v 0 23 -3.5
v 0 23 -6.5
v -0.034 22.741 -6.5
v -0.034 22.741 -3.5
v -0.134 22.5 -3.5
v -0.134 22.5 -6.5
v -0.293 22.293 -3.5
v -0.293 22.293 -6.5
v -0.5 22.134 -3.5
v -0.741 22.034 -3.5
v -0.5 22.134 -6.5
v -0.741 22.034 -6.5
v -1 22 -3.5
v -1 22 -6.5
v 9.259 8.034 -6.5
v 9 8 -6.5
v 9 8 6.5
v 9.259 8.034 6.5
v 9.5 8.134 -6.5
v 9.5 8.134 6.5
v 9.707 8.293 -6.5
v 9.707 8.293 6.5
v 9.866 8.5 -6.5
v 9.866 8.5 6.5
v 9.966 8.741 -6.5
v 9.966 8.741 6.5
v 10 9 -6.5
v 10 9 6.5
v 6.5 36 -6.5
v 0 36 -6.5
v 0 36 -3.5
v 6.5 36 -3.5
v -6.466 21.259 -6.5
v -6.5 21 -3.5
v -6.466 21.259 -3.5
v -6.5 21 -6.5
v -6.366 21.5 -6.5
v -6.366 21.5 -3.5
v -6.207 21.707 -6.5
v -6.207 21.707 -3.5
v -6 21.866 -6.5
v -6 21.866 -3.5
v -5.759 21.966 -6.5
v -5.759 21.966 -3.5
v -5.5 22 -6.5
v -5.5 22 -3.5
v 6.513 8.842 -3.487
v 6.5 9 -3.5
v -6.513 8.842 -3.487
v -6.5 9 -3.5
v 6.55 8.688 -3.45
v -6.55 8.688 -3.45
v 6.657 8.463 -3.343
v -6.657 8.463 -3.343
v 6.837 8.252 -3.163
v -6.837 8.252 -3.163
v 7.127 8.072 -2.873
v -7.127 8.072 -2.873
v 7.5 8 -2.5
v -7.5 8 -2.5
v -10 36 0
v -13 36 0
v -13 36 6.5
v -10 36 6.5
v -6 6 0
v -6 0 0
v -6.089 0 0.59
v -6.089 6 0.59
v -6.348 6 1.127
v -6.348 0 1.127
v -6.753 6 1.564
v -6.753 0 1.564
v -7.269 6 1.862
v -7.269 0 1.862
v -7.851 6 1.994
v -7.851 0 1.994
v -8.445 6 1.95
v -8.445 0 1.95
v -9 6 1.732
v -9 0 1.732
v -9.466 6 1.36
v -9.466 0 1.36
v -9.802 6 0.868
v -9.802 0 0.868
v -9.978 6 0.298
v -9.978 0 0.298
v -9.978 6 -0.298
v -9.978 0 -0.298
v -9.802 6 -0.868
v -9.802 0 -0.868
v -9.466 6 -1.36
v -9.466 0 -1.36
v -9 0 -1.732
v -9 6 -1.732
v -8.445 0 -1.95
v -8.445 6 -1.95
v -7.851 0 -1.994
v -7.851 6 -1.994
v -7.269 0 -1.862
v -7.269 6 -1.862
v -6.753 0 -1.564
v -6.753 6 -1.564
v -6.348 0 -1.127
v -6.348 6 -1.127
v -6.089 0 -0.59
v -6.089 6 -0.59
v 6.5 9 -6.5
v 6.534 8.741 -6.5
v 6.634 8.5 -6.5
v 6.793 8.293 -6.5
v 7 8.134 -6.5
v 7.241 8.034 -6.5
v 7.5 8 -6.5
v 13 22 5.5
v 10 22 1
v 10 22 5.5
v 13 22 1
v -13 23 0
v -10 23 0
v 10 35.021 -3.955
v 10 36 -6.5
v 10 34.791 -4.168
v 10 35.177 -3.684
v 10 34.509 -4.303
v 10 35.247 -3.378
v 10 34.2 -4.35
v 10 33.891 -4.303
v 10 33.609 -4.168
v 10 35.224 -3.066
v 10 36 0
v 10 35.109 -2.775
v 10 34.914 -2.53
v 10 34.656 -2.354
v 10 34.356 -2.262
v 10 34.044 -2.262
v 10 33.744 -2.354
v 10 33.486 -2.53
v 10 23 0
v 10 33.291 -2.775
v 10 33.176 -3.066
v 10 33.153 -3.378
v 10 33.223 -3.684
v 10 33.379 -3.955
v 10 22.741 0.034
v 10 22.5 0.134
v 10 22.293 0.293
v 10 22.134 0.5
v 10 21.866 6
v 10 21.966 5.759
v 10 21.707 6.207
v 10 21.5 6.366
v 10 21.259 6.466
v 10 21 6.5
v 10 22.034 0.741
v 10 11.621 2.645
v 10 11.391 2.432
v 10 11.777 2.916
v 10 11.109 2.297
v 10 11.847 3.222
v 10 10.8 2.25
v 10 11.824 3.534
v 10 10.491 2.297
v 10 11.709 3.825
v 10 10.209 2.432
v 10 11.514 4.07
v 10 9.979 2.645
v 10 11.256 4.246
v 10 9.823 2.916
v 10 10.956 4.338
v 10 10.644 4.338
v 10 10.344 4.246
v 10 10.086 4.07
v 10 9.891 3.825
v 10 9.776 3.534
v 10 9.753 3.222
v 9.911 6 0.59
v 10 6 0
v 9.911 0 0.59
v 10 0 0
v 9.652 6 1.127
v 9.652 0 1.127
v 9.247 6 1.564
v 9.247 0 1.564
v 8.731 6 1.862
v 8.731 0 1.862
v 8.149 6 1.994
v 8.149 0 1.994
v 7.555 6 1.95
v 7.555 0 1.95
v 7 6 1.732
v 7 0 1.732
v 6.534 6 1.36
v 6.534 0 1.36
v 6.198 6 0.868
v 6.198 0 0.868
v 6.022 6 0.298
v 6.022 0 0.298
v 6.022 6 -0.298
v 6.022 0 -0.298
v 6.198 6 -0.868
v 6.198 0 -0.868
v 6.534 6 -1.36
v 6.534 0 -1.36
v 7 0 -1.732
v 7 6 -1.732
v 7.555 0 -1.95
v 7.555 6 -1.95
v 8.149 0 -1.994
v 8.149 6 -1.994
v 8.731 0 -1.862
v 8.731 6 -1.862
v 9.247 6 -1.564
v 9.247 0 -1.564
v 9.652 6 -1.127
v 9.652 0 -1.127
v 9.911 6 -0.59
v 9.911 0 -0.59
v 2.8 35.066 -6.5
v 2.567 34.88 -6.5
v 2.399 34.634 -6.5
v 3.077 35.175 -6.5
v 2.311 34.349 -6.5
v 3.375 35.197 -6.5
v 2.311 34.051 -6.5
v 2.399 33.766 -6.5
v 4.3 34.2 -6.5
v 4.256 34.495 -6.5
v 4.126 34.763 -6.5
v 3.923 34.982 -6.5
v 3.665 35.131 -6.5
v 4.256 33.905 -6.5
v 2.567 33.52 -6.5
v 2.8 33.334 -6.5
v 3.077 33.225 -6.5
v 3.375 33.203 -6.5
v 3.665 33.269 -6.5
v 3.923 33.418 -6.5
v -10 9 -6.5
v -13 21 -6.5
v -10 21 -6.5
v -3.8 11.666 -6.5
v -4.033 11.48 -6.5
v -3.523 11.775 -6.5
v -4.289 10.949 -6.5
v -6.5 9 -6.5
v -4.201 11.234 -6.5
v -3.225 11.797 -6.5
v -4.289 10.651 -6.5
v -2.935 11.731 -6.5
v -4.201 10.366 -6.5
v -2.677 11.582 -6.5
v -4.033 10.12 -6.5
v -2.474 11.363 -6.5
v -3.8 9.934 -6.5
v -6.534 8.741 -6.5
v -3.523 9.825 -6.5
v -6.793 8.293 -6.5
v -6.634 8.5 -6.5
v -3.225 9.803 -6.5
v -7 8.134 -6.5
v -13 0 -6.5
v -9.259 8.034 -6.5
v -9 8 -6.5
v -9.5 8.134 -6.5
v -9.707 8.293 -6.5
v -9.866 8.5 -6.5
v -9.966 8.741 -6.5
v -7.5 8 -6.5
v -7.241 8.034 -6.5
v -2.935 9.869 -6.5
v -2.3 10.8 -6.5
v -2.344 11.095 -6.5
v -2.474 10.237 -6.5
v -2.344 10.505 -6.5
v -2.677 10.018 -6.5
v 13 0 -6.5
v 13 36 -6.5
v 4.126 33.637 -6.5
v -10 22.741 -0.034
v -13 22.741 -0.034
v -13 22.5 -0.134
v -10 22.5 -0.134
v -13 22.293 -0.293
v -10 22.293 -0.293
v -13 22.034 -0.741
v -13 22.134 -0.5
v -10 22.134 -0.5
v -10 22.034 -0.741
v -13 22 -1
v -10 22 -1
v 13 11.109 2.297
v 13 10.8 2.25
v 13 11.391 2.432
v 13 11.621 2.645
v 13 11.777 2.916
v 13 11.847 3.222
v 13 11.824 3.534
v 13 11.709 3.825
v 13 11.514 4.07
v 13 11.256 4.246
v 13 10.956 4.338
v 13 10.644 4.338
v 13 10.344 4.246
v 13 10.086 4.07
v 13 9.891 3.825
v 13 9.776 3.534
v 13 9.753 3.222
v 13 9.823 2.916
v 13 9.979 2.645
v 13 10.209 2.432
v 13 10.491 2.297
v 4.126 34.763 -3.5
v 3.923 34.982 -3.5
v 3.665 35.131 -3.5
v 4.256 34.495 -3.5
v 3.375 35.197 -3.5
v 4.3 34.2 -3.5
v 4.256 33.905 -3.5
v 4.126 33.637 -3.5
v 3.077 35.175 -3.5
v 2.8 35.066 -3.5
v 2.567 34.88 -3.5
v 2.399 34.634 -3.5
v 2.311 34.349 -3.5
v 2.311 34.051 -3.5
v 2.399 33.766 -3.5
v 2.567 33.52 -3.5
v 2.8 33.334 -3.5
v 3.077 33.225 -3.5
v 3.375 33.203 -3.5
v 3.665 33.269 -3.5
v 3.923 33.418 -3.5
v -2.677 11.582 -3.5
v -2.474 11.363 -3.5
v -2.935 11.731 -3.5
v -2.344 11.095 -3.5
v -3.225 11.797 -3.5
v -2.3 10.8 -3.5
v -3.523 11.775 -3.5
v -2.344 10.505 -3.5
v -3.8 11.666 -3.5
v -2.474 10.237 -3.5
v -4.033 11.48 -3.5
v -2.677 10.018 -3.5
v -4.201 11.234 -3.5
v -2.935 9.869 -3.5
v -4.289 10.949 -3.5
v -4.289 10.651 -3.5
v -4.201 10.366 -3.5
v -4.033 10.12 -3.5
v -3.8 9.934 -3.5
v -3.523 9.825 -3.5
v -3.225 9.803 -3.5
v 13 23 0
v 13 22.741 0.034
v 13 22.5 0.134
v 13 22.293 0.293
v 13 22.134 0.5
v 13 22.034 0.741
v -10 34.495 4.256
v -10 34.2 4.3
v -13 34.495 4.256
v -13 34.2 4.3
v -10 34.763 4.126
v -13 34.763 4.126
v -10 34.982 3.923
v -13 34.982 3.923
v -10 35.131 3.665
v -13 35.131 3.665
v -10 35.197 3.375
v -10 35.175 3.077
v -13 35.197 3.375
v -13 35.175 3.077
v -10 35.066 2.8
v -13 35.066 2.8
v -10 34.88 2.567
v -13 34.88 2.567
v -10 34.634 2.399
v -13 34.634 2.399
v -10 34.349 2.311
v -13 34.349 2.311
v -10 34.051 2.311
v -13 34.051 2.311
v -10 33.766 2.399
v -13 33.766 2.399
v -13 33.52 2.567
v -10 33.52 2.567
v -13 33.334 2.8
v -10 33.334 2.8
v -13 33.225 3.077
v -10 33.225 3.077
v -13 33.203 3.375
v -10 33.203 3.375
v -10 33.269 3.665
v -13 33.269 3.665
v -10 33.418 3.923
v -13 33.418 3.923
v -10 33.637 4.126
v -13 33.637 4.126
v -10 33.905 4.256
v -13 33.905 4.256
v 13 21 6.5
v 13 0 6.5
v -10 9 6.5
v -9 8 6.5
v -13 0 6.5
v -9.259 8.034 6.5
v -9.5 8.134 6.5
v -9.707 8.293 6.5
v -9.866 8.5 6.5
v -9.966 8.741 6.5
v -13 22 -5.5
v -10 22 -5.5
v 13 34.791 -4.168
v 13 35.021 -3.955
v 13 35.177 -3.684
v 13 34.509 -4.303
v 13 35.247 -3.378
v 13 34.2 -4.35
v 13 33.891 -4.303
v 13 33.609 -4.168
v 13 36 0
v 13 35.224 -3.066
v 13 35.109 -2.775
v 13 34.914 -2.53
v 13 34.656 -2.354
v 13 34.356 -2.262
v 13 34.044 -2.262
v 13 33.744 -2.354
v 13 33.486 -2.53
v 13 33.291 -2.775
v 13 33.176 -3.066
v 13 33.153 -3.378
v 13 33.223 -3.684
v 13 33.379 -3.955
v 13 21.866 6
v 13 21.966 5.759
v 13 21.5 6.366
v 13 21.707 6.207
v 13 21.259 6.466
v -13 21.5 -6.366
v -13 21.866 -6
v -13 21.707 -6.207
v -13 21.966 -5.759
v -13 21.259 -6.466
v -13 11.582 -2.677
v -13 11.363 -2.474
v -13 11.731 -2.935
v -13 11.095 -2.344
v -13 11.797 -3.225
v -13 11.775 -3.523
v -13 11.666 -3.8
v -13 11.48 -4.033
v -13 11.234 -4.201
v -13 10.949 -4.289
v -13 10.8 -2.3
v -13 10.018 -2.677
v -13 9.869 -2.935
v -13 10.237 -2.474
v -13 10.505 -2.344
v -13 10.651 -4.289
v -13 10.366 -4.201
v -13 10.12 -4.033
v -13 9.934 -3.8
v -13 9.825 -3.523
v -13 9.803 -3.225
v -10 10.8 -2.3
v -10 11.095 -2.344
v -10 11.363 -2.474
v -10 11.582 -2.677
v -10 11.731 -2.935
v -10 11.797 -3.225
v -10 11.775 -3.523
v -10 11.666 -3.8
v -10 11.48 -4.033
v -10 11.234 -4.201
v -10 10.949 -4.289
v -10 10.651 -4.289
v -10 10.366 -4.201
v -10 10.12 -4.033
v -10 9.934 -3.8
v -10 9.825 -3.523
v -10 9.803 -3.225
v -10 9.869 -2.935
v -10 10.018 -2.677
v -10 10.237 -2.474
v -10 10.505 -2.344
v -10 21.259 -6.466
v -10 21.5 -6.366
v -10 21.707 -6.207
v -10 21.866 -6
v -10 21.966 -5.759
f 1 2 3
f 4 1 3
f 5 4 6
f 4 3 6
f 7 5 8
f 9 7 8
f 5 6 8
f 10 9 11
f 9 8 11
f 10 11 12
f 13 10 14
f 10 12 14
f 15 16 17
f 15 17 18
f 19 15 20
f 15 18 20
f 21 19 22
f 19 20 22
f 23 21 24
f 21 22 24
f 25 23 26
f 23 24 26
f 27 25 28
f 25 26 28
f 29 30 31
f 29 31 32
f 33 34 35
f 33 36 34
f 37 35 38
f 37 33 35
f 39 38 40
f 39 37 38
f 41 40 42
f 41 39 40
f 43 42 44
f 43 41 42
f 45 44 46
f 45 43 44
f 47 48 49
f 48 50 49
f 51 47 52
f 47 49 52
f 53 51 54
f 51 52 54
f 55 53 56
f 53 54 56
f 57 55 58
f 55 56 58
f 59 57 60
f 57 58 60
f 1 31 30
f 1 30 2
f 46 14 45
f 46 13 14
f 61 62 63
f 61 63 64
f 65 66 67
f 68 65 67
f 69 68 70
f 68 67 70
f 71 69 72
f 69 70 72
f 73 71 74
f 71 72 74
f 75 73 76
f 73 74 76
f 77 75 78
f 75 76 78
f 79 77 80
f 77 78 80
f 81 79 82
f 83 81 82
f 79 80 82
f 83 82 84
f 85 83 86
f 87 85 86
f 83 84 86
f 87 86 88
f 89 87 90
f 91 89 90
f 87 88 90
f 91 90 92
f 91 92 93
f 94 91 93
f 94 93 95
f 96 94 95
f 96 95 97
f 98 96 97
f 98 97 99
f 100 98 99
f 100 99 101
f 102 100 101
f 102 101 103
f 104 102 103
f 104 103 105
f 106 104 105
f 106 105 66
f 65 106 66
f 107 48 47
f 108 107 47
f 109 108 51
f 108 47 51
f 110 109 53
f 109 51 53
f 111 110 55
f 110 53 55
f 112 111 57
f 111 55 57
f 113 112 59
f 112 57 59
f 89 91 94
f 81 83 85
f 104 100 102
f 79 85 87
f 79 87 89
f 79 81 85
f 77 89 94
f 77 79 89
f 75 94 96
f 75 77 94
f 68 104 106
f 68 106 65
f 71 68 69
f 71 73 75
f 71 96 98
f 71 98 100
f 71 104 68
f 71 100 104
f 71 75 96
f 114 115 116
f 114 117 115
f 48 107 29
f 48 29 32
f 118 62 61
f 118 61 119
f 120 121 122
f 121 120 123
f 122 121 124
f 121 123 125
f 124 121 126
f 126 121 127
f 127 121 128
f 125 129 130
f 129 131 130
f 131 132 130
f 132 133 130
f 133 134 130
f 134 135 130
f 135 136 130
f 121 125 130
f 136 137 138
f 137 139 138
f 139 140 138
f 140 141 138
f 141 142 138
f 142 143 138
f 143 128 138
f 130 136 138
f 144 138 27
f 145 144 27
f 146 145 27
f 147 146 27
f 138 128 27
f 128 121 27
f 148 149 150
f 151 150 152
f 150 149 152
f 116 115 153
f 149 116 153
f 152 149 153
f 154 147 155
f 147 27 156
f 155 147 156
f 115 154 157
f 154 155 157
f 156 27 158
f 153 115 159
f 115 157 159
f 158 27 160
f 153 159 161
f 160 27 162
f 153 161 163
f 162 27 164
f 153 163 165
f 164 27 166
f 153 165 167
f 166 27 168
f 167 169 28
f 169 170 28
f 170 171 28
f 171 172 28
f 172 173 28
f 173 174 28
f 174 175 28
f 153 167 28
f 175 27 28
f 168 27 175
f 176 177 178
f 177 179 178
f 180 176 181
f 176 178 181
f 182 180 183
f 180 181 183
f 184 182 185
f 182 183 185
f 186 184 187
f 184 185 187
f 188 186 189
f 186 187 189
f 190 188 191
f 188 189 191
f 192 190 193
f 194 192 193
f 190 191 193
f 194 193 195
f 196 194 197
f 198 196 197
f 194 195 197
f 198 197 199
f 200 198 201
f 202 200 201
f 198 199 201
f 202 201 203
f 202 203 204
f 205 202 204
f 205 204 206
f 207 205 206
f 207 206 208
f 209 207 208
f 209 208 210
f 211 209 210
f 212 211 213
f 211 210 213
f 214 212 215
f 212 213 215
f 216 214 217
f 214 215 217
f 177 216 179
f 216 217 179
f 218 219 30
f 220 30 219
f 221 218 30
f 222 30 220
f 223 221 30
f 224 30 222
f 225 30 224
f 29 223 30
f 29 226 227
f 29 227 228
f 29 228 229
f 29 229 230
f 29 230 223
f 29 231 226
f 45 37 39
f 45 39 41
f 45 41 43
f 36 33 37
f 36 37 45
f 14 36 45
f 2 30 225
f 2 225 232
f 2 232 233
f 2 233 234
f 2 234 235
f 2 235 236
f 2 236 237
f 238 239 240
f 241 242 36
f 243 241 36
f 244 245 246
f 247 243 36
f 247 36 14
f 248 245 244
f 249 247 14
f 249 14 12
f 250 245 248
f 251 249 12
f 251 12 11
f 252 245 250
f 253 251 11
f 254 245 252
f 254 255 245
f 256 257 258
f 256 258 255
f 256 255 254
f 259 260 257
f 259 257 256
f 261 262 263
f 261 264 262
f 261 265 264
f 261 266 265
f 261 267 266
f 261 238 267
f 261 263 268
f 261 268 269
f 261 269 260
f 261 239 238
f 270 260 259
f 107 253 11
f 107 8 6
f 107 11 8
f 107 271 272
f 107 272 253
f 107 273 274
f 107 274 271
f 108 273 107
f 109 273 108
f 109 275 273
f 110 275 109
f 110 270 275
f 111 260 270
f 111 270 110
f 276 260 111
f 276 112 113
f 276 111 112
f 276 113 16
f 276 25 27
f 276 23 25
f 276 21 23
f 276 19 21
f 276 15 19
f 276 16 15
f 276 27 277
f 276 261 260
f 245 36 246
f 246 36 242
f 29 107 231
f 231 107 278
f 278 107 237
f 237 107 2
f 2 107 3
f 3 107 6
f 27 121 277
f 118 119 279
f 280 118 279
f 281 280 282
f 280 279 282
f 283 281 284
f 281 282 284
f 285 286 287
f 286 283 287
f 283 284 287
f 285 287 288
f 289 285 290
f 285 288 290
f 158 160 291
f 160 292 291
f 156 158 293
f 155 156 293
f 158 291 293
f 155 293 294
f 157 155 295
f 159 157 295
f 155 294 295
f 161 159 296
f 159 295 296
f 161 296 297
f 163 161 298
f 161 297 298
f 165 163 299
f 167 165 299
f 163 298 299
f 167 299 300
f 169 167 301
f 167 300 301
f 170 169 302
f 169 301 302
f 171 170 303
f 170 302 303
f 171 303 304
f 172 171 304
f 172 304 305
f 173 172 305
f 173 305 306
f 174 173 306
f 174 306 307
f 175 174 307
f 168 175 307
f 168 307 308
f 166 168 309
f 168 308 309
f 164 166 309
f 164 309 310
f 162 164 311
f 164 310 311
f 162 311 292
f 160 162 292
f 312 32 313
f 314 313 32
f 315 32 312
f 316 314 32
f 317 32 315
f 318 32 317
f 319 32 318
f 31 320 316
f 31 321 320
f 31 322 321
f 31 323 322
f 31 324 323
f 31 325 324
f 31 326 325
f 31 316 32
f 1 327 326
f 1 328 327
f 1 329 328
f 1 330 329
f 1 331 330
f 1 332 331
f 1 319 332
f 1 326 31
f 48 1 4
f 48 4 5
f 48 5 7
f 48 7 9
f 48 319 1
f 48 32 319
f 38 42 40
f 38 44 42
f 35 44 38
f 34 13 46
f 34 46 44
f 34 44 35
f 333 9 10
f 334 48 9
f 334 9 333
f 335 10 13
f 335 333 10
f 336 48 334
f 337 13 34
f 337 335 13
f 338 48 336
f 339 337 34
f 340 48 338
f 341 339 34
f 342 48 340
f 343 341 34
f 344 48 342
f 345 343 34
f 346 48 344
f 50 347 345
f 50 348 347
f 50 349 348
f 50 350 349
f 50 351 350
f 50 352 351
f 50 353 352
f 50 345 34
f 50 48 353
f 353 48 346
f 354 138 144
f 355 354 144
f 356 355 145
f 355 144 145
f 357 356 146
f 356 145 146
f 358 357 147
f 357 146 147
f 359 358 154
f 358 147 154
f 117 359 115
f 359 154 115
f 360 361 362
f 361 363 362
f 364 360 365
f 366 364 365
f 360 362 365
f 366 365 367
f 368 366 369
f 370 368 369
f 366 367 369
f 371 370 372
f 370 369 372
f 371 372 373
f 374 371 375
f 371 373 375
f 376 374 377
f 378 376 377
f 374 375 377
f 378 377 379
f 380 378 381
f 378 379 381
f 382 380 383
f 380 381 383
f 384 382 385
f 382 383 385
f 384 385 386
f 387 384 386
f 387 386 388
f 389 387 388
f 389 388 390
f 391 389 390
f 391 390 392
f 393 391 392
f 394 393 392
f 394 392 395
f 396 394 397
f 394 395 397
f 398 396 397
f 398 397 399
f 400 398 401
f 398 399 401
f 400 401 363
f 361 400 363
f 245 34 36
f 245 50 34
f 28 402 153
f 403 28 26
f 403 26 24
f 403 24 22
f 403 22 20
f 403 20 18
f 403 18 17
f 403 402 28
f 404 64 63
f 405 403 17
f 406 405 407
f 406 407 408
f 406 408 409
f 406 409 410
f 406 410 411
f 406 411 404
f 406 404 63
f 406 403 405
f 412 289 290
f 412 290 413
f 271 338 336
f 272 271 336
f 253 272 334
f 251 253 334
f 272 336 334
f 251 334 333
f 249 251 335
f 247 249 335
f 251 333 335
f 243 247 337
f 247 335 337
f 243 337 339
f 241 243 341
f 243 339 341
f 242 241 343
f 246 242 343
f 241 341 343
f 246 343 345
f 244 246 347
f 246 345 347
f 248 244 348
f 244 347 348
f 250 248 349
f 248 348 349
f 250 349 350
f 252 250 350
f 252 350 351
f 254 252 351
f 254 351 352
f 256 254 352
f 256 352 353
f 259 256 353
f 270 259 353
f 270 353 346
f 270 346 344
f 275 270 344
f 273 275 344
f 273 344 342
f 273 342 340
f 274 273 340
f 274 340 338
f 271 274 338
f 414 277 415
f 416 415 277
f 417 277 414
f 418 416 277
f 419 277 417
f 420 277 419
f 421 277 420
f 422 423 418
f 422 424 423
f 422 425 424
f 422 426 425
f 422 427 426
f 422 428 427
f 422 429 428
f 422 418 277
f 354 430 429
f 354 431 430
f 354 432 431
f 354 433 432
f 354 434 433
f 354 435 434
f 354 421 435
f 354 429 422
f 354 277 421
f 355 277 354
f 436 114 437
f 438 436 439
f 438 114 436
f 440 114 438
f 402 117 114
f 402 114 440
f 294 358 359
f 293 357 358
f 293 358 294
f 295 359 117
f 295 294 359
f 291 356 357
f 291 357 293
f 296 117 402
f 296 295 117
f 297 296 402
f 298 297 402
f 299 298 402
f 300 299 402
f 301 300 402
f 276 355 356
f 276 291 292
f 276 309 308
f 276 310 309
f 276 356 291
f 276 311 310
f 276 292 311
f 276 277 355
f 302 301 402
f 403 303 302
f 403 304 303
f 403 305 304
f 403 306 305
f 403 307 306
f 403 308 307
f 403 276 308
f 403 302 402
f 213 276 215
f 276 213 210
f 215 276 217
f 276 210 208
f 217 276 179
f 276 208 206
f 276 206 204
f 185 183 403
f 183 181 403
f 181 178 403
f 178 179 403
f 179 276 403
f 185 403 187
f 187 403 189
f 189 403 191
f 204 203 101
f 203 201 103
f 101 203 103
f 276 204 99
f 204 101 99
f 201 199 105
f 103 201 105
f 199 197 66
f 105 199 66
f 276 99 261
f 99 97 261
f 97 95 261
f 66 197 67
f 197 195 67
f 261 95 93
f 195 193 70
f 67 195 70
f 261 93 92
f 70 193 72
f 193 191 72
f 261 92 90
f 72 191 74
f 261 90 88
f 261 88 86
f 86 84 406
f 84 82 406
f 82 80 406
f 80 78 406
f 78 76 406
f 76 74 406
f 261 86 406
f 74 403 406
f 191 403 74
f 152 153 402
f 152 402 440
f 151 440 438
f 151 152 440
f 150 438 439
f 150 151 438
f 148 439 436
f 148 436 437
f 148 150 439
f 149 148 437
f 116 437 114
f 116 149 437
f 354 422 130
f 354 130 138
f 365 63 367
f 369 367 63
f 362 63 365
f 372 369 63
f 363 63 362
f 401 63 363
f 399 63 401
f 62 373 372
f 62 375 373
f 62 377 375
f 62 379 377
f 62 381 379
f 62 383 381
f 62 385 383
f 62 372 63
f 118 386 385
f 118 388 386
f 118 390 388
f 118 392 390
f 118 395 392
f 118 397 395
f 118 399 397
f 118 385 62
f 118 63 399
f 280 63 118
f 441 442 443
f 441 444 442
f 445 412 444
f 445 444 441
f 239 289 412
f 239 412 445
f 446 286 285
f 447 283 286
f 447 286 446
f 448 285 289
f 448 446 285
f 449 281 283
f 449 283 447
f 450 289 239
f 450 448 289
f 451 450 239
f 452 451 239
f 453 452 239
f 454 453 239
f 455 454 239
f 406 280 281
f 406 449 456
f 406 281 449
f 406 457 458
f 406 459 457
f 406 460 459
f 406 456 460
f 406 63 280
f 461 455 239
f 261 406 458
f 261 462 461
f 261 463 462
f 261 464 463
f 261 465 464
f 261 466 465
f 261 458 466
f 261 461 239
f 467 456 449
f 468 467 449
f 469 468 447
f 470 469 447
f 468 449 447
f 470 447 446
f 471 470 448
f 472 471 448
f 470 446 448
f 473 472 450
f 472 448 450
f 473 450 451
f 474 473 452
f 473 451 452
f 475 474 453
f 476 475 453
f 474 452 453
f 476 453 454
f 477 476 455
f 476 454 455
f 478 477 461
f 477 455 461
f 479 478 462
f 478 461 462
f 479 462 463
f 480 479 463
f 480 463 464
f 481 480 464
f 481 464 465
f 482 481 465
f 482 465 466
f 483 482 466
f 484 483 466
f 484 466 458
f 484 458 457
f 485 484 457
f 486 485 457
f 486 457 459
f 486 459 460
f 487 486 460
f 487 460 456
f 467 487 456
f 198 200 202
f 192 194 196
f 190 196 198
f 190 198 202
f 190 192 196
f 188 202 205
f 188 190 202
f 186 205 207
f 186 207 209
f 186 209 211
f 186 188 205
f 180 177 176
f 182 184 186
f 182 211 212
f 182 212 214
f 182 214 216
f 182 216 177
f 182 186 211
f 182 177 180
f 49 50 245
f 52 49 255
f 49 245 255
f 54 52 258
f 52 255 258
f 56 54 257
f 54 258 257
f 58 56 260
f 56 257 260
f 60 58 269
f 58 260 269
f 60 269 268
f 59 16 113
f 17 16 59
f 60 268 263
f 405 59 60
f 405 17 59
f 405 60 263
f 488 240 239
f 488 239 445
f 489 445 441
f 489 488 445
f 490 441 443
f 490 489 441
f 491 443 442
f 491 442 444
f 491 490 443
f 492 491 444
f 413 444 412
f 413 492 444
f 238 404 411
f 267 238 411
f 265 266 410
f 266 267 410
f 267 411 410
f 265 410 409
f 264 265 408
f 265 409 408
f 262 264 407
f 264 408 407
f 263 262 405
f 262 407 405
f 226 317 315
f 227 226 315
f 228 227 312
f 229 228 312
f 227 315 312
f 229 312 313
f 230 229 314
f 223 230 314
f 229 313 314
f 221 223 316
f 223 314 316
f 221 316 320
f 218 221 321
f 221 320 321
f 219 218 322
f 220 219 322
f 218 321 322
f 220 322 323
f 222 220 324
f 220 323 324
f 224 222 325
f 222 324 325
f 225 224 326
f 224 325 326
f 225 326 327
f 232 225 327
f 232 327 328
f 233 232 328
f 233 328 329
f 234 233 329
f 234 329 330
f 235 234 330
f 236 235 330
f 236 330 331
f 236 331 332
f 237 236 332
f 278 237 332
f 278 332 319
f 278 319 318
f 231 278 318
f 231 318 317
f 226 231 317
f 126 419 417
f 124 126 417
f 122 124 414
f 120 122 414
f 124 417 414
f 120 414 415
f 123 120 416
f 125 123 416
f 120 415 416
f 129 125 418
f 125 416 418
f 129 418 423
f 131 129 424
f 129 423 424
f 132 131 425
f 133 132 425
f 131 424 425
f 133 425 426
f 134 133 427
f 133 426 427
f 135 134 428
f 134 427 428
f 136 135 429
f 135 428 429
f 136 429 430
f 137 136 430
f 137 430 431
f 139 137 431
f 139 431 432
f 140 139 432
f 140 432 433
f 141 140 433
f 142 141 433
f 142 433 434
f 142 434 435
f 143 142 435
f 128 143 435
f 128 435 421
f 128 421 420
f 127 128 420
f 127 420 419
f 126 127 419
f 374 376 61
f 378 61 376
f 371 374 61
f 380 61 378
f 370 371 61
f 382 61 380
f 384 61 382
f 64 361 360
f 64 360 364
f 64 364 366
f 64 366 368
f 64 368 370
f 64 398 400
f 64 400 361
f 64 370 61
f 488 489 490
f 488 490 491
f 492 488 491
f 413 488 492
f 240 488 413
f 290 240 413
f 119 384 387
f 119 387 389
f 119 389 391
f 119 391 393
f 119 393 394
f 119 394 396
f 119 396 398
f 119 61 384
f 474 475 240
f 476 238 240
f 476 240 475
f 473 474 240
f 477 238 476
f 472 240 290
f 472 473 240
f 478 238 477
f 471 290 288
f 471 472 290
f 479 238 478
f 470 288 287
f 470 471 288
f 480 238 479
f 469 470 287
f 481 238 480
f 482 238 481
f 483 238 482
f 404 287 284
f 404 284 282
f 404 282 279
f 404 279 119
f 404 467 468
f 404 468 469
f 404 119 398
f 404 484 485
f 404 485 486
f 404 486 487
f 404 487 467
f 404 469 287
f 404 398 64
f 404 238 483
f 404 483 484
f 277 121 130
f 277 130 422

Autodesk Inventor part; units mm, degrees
ref_plane "YZ Plane" through (0, 0, 0) normal (1, 0, 0) x (0, 1, 0)
ref_plane "TOP" through (0, 36, 0) normal (0, 1, 0) x (-1, 0, 0)
sketch "Sketch1" plane through (0, 0, 0) normal (0, 1, 0) x (-1, 0, 0)
  line L0 (13, -6.5) -> (-13, -6.5)
  line L1 (-13, -6.5) -> (-13, 6.5)
  line L2 (-13, 6.5) -> (13, 6.5)
  line L3 (13, 6.5) -> (13, -6.5)
  line L4 (0, -9.1) -> (0, 9.1) projected
  line L5 (18.2, 0) -> (-18.2, 0) projected
  point P0 (0, 0)
  dimension "d0" = 26
  dimension "d1" = 13
extrude "Extrusion1" add sketch "Sketch1" along normal blind 8
sketch "Sketch2" plane through (0, 8, 0) normal (0, 1, 0) x (1, 0, 0)
  line L0 (-13, 6.5) -> (-13, -6.5) projected
  line L1 (-13, 6.5) -> (-10, 6.5)
  line L2 (-10, 6.5) -> (-10, -6.5)
  line L3 (-10, -6.5) -> (-13, -6.5)
  line L4 (-13, -6.5) -> (-13, 6.5)
  line L5 (13, 6.5) -> (-13, 6.5) projected
  line L6 (13, 6.5) -> (10, 6.5)
  line L7 (10, 6.5) -> (10, -6.5)
  line L8 (10, -6.5) -> (13, -6.5)
  line L9 (13, -6.5) -> (13, 6.5)
  line L10 (-6.5, 6.5) -> (6.5, 6.5)
  line L11 (6.5, 6.5) -> (6.5, 3.5)
  line L12 (6.5, 3.5) -> (-6.5, 3.5)
  line L13 (-6.5, 3.5) -> (-6.5, 6.5)
  line L14 (0, 9.1) -> (0, -9.1) projected
  line L15 (-13, -6.5) -> (13, -6.5) projected
  point P0 (0, 0)
  dimension "d4" = 3
  dimension "d5" = 3
  dimension "d6" = 3
  dimension "d7" = 13
extrude "Extrusion2" add sketch "Sketch2" along normal up to surface (28 mm away) contours L1 L2 L3 L0 | L5 L14 L12 L13 | L5 L11 L12 L14 | L7 L5 L9 L8
sketch "Sketch3" plane through (-13, 0, -6.5) normal (-1, 0, 0) x (0, 0, 1)
  line L0 (0, 36) -> (6.5, 36)
  line L1 (6.5, 36) -> (6.5, 22)
  line L2 (6.5, 22) -> (0, 22)
  line L3 (0, 22) -> (0, 36)
  line L4 (0, 0) -> (13, 0) projected
  line L5 (13, 0) -> (13, 36) projected
  line L6 (13, 36) -> (0, 36) projected
  line L7 (0, 0) -> (0, 36) projected
  point P0 (6.5, 0)
  dimension "d11" = 22
  dimension "d12" = 6.5
extrude "Extrusion3" cut sketch "Sketch3" against normal blind 3 contours L0 L1 L2 L3
sketch "Sketch4" plane through (13, 0, 6.5) normal (1, 0, 0) x (0, 0, -1)
  line L0 (6.5, 36) -> (0, 36) projected
  line L1 (0, 36) -> (6.5, 36)
  line L2 (6.5, 36) -> (6.5, 22)
  line L3 (6.5, 22) -> (0, 22)
  line L4 (0, 22) -> (0, 36)
  line L5 (-2.6, 0) -> (15.6, 0) projected
  line L6 (13, 0) -> (13, 36) projected
  point P0 (6.5, 0)
  dimension "d15" = 22
  dimension "d16" = 6.5
extrude "Extrusion4" cut sketch "Sketch4" against normal blind 3
sketch "Sketch5" plane through (-6.5, 8, -3.5) normal (0, 0, 1) x (1, 0, 0)
  line L0 (0, 0) -> (0, 28) projected
  line L1 (0, 28) -> (6.5, 28)
  line L2 (6.5, 28) -> (6.5, 14)
  line L3 (6.5, 14) -> (0, 14)
  line L4 (0, 14) -> (0, 28)
  line L5 (13, 0) -> (13, 28) projected
  line L6 (-6.5, -8) -> (19.5, -8) projected
  point P0 (6.5, -8)
  point P1 (0, 14)
  dimension "d19" = 6.5
  dimension "d20" = 22
extrude "Extrusion5" cut sketch "Sketch5" against normal blind 3
sketch "Sketch6" plane through (13, 0, 6.5) normal (1, 0, 0) x (0, 0, -1)
  circle A0 centre (9.8, 34.2) radius 1.05
  circle A1 centre (3.2, 10.8) radius 1.05
  line L0 (13, 0) -> (13, 36) projected
  line L1 (13, 36) -> (6.5, 36) projected
  line L2 (0, 0) -> (0, 22) projected
  line L3 (6.5, 36) -> (6.5, 22) projected
  point P0 (6.5, 0)
  point P1 (0, 8)
  dimension "d23" = 2.1
  dimension "d25" = 1.8
  dimension "d27" = 2.8
  dimension "d30" = 3.3
  dimension "d31" = 3.3
extrude "Extrusion6" cut sketch "Sketch6" against normal blind 3
ref_plane "Work Plane2" through (13, 22, 6.5) normal (0, 1, 0) x (1, 0, 0)
sketch "Sketch7" plane through (-13, 0, -6.5) normal (-1, 0, 0) x (0, 0, 1)
  circle A0 centre (9.8, 34.2) radius 1
  circle A1 centre (3.2, 10.8) radius 1
  line L0 (6.5, 43.2) -> (6.5, -7.2) projected
  line L1 (13, 36) -> (6.5, 36) projected
  line L2 (13, 8) -> (0, 8) projected
  line L3 (0, 8) -> (3, 8) projected
  line L4 (3, 8) -> (0, 8) projected
  line L5 (0, 8) -> (13, 8) projected
  point P0 (6.5, 0)
  dimension "d33" = 2
  dimension "d34" = 3.3
  dimension "d35" = 1.8
  dimension "d36" = 3.3
  dimension "d37" = 2.8
extrude "Extrusion7" cut sketch "Sketch7" against normal blind 3
sketch "Sketch8" plane through (-6.5, 8, -3.5) normal (0, 0, 1) x (1, 0, 0)
  circle A0 centre (9.8, 26.2) radius 1
  circle A1 centre (3.2, 2.8) radius 1
  line L0 (-11.7, 28) -> (24.7, 28) projected
  line L1 (6.5, 35.2) -> (6.5, -15.2) projected
  line L2 (-3.5, 0) -> (16.5, 0) projected
  point P0 (6.5, -8)
  dimension "d40" = 2
  dimension "d41" = 1.8
  dimension "d42" = 3.3
  dimension "d43" = 3.3
  dimension "d44" = 2.8
extrude "Extrusion8" cut sketch "Sketch8" against normal blind 3
sketch "Sketch9" plane through (0, 0, 0) normal (0, -1, 0) x (1, 0, 0)
  circle A0 centre (-8, 0) radius 2
  circle A1 centre (8, 0) radius 2
  line L0 (0, -9.1) -> (0, 9.1) projected
  line L1 (-18.2, 0) -> (18.2, 0) projected
  point P0 (0, 0)
  dimension "d47" = 4
  dimension "d48" = 16
extrude "Extrusion9" cut sketch "Sketch9" against normal blind 6
fillet "Fillet1" radius 1 11 edges at (10, 8, 0) (-10, 8, 0) (11.5, 22, 6.5) (11.5, 22, 0) (-11.5, 22, -6.5) (-11.5, 22, 0) (-6.5, 22, -5) (0, 22, -5) (6.5, 8, -5) (0, 8, -3.5) (-6.5, 8, -5)
properties part number "sg_sensor_mount"
